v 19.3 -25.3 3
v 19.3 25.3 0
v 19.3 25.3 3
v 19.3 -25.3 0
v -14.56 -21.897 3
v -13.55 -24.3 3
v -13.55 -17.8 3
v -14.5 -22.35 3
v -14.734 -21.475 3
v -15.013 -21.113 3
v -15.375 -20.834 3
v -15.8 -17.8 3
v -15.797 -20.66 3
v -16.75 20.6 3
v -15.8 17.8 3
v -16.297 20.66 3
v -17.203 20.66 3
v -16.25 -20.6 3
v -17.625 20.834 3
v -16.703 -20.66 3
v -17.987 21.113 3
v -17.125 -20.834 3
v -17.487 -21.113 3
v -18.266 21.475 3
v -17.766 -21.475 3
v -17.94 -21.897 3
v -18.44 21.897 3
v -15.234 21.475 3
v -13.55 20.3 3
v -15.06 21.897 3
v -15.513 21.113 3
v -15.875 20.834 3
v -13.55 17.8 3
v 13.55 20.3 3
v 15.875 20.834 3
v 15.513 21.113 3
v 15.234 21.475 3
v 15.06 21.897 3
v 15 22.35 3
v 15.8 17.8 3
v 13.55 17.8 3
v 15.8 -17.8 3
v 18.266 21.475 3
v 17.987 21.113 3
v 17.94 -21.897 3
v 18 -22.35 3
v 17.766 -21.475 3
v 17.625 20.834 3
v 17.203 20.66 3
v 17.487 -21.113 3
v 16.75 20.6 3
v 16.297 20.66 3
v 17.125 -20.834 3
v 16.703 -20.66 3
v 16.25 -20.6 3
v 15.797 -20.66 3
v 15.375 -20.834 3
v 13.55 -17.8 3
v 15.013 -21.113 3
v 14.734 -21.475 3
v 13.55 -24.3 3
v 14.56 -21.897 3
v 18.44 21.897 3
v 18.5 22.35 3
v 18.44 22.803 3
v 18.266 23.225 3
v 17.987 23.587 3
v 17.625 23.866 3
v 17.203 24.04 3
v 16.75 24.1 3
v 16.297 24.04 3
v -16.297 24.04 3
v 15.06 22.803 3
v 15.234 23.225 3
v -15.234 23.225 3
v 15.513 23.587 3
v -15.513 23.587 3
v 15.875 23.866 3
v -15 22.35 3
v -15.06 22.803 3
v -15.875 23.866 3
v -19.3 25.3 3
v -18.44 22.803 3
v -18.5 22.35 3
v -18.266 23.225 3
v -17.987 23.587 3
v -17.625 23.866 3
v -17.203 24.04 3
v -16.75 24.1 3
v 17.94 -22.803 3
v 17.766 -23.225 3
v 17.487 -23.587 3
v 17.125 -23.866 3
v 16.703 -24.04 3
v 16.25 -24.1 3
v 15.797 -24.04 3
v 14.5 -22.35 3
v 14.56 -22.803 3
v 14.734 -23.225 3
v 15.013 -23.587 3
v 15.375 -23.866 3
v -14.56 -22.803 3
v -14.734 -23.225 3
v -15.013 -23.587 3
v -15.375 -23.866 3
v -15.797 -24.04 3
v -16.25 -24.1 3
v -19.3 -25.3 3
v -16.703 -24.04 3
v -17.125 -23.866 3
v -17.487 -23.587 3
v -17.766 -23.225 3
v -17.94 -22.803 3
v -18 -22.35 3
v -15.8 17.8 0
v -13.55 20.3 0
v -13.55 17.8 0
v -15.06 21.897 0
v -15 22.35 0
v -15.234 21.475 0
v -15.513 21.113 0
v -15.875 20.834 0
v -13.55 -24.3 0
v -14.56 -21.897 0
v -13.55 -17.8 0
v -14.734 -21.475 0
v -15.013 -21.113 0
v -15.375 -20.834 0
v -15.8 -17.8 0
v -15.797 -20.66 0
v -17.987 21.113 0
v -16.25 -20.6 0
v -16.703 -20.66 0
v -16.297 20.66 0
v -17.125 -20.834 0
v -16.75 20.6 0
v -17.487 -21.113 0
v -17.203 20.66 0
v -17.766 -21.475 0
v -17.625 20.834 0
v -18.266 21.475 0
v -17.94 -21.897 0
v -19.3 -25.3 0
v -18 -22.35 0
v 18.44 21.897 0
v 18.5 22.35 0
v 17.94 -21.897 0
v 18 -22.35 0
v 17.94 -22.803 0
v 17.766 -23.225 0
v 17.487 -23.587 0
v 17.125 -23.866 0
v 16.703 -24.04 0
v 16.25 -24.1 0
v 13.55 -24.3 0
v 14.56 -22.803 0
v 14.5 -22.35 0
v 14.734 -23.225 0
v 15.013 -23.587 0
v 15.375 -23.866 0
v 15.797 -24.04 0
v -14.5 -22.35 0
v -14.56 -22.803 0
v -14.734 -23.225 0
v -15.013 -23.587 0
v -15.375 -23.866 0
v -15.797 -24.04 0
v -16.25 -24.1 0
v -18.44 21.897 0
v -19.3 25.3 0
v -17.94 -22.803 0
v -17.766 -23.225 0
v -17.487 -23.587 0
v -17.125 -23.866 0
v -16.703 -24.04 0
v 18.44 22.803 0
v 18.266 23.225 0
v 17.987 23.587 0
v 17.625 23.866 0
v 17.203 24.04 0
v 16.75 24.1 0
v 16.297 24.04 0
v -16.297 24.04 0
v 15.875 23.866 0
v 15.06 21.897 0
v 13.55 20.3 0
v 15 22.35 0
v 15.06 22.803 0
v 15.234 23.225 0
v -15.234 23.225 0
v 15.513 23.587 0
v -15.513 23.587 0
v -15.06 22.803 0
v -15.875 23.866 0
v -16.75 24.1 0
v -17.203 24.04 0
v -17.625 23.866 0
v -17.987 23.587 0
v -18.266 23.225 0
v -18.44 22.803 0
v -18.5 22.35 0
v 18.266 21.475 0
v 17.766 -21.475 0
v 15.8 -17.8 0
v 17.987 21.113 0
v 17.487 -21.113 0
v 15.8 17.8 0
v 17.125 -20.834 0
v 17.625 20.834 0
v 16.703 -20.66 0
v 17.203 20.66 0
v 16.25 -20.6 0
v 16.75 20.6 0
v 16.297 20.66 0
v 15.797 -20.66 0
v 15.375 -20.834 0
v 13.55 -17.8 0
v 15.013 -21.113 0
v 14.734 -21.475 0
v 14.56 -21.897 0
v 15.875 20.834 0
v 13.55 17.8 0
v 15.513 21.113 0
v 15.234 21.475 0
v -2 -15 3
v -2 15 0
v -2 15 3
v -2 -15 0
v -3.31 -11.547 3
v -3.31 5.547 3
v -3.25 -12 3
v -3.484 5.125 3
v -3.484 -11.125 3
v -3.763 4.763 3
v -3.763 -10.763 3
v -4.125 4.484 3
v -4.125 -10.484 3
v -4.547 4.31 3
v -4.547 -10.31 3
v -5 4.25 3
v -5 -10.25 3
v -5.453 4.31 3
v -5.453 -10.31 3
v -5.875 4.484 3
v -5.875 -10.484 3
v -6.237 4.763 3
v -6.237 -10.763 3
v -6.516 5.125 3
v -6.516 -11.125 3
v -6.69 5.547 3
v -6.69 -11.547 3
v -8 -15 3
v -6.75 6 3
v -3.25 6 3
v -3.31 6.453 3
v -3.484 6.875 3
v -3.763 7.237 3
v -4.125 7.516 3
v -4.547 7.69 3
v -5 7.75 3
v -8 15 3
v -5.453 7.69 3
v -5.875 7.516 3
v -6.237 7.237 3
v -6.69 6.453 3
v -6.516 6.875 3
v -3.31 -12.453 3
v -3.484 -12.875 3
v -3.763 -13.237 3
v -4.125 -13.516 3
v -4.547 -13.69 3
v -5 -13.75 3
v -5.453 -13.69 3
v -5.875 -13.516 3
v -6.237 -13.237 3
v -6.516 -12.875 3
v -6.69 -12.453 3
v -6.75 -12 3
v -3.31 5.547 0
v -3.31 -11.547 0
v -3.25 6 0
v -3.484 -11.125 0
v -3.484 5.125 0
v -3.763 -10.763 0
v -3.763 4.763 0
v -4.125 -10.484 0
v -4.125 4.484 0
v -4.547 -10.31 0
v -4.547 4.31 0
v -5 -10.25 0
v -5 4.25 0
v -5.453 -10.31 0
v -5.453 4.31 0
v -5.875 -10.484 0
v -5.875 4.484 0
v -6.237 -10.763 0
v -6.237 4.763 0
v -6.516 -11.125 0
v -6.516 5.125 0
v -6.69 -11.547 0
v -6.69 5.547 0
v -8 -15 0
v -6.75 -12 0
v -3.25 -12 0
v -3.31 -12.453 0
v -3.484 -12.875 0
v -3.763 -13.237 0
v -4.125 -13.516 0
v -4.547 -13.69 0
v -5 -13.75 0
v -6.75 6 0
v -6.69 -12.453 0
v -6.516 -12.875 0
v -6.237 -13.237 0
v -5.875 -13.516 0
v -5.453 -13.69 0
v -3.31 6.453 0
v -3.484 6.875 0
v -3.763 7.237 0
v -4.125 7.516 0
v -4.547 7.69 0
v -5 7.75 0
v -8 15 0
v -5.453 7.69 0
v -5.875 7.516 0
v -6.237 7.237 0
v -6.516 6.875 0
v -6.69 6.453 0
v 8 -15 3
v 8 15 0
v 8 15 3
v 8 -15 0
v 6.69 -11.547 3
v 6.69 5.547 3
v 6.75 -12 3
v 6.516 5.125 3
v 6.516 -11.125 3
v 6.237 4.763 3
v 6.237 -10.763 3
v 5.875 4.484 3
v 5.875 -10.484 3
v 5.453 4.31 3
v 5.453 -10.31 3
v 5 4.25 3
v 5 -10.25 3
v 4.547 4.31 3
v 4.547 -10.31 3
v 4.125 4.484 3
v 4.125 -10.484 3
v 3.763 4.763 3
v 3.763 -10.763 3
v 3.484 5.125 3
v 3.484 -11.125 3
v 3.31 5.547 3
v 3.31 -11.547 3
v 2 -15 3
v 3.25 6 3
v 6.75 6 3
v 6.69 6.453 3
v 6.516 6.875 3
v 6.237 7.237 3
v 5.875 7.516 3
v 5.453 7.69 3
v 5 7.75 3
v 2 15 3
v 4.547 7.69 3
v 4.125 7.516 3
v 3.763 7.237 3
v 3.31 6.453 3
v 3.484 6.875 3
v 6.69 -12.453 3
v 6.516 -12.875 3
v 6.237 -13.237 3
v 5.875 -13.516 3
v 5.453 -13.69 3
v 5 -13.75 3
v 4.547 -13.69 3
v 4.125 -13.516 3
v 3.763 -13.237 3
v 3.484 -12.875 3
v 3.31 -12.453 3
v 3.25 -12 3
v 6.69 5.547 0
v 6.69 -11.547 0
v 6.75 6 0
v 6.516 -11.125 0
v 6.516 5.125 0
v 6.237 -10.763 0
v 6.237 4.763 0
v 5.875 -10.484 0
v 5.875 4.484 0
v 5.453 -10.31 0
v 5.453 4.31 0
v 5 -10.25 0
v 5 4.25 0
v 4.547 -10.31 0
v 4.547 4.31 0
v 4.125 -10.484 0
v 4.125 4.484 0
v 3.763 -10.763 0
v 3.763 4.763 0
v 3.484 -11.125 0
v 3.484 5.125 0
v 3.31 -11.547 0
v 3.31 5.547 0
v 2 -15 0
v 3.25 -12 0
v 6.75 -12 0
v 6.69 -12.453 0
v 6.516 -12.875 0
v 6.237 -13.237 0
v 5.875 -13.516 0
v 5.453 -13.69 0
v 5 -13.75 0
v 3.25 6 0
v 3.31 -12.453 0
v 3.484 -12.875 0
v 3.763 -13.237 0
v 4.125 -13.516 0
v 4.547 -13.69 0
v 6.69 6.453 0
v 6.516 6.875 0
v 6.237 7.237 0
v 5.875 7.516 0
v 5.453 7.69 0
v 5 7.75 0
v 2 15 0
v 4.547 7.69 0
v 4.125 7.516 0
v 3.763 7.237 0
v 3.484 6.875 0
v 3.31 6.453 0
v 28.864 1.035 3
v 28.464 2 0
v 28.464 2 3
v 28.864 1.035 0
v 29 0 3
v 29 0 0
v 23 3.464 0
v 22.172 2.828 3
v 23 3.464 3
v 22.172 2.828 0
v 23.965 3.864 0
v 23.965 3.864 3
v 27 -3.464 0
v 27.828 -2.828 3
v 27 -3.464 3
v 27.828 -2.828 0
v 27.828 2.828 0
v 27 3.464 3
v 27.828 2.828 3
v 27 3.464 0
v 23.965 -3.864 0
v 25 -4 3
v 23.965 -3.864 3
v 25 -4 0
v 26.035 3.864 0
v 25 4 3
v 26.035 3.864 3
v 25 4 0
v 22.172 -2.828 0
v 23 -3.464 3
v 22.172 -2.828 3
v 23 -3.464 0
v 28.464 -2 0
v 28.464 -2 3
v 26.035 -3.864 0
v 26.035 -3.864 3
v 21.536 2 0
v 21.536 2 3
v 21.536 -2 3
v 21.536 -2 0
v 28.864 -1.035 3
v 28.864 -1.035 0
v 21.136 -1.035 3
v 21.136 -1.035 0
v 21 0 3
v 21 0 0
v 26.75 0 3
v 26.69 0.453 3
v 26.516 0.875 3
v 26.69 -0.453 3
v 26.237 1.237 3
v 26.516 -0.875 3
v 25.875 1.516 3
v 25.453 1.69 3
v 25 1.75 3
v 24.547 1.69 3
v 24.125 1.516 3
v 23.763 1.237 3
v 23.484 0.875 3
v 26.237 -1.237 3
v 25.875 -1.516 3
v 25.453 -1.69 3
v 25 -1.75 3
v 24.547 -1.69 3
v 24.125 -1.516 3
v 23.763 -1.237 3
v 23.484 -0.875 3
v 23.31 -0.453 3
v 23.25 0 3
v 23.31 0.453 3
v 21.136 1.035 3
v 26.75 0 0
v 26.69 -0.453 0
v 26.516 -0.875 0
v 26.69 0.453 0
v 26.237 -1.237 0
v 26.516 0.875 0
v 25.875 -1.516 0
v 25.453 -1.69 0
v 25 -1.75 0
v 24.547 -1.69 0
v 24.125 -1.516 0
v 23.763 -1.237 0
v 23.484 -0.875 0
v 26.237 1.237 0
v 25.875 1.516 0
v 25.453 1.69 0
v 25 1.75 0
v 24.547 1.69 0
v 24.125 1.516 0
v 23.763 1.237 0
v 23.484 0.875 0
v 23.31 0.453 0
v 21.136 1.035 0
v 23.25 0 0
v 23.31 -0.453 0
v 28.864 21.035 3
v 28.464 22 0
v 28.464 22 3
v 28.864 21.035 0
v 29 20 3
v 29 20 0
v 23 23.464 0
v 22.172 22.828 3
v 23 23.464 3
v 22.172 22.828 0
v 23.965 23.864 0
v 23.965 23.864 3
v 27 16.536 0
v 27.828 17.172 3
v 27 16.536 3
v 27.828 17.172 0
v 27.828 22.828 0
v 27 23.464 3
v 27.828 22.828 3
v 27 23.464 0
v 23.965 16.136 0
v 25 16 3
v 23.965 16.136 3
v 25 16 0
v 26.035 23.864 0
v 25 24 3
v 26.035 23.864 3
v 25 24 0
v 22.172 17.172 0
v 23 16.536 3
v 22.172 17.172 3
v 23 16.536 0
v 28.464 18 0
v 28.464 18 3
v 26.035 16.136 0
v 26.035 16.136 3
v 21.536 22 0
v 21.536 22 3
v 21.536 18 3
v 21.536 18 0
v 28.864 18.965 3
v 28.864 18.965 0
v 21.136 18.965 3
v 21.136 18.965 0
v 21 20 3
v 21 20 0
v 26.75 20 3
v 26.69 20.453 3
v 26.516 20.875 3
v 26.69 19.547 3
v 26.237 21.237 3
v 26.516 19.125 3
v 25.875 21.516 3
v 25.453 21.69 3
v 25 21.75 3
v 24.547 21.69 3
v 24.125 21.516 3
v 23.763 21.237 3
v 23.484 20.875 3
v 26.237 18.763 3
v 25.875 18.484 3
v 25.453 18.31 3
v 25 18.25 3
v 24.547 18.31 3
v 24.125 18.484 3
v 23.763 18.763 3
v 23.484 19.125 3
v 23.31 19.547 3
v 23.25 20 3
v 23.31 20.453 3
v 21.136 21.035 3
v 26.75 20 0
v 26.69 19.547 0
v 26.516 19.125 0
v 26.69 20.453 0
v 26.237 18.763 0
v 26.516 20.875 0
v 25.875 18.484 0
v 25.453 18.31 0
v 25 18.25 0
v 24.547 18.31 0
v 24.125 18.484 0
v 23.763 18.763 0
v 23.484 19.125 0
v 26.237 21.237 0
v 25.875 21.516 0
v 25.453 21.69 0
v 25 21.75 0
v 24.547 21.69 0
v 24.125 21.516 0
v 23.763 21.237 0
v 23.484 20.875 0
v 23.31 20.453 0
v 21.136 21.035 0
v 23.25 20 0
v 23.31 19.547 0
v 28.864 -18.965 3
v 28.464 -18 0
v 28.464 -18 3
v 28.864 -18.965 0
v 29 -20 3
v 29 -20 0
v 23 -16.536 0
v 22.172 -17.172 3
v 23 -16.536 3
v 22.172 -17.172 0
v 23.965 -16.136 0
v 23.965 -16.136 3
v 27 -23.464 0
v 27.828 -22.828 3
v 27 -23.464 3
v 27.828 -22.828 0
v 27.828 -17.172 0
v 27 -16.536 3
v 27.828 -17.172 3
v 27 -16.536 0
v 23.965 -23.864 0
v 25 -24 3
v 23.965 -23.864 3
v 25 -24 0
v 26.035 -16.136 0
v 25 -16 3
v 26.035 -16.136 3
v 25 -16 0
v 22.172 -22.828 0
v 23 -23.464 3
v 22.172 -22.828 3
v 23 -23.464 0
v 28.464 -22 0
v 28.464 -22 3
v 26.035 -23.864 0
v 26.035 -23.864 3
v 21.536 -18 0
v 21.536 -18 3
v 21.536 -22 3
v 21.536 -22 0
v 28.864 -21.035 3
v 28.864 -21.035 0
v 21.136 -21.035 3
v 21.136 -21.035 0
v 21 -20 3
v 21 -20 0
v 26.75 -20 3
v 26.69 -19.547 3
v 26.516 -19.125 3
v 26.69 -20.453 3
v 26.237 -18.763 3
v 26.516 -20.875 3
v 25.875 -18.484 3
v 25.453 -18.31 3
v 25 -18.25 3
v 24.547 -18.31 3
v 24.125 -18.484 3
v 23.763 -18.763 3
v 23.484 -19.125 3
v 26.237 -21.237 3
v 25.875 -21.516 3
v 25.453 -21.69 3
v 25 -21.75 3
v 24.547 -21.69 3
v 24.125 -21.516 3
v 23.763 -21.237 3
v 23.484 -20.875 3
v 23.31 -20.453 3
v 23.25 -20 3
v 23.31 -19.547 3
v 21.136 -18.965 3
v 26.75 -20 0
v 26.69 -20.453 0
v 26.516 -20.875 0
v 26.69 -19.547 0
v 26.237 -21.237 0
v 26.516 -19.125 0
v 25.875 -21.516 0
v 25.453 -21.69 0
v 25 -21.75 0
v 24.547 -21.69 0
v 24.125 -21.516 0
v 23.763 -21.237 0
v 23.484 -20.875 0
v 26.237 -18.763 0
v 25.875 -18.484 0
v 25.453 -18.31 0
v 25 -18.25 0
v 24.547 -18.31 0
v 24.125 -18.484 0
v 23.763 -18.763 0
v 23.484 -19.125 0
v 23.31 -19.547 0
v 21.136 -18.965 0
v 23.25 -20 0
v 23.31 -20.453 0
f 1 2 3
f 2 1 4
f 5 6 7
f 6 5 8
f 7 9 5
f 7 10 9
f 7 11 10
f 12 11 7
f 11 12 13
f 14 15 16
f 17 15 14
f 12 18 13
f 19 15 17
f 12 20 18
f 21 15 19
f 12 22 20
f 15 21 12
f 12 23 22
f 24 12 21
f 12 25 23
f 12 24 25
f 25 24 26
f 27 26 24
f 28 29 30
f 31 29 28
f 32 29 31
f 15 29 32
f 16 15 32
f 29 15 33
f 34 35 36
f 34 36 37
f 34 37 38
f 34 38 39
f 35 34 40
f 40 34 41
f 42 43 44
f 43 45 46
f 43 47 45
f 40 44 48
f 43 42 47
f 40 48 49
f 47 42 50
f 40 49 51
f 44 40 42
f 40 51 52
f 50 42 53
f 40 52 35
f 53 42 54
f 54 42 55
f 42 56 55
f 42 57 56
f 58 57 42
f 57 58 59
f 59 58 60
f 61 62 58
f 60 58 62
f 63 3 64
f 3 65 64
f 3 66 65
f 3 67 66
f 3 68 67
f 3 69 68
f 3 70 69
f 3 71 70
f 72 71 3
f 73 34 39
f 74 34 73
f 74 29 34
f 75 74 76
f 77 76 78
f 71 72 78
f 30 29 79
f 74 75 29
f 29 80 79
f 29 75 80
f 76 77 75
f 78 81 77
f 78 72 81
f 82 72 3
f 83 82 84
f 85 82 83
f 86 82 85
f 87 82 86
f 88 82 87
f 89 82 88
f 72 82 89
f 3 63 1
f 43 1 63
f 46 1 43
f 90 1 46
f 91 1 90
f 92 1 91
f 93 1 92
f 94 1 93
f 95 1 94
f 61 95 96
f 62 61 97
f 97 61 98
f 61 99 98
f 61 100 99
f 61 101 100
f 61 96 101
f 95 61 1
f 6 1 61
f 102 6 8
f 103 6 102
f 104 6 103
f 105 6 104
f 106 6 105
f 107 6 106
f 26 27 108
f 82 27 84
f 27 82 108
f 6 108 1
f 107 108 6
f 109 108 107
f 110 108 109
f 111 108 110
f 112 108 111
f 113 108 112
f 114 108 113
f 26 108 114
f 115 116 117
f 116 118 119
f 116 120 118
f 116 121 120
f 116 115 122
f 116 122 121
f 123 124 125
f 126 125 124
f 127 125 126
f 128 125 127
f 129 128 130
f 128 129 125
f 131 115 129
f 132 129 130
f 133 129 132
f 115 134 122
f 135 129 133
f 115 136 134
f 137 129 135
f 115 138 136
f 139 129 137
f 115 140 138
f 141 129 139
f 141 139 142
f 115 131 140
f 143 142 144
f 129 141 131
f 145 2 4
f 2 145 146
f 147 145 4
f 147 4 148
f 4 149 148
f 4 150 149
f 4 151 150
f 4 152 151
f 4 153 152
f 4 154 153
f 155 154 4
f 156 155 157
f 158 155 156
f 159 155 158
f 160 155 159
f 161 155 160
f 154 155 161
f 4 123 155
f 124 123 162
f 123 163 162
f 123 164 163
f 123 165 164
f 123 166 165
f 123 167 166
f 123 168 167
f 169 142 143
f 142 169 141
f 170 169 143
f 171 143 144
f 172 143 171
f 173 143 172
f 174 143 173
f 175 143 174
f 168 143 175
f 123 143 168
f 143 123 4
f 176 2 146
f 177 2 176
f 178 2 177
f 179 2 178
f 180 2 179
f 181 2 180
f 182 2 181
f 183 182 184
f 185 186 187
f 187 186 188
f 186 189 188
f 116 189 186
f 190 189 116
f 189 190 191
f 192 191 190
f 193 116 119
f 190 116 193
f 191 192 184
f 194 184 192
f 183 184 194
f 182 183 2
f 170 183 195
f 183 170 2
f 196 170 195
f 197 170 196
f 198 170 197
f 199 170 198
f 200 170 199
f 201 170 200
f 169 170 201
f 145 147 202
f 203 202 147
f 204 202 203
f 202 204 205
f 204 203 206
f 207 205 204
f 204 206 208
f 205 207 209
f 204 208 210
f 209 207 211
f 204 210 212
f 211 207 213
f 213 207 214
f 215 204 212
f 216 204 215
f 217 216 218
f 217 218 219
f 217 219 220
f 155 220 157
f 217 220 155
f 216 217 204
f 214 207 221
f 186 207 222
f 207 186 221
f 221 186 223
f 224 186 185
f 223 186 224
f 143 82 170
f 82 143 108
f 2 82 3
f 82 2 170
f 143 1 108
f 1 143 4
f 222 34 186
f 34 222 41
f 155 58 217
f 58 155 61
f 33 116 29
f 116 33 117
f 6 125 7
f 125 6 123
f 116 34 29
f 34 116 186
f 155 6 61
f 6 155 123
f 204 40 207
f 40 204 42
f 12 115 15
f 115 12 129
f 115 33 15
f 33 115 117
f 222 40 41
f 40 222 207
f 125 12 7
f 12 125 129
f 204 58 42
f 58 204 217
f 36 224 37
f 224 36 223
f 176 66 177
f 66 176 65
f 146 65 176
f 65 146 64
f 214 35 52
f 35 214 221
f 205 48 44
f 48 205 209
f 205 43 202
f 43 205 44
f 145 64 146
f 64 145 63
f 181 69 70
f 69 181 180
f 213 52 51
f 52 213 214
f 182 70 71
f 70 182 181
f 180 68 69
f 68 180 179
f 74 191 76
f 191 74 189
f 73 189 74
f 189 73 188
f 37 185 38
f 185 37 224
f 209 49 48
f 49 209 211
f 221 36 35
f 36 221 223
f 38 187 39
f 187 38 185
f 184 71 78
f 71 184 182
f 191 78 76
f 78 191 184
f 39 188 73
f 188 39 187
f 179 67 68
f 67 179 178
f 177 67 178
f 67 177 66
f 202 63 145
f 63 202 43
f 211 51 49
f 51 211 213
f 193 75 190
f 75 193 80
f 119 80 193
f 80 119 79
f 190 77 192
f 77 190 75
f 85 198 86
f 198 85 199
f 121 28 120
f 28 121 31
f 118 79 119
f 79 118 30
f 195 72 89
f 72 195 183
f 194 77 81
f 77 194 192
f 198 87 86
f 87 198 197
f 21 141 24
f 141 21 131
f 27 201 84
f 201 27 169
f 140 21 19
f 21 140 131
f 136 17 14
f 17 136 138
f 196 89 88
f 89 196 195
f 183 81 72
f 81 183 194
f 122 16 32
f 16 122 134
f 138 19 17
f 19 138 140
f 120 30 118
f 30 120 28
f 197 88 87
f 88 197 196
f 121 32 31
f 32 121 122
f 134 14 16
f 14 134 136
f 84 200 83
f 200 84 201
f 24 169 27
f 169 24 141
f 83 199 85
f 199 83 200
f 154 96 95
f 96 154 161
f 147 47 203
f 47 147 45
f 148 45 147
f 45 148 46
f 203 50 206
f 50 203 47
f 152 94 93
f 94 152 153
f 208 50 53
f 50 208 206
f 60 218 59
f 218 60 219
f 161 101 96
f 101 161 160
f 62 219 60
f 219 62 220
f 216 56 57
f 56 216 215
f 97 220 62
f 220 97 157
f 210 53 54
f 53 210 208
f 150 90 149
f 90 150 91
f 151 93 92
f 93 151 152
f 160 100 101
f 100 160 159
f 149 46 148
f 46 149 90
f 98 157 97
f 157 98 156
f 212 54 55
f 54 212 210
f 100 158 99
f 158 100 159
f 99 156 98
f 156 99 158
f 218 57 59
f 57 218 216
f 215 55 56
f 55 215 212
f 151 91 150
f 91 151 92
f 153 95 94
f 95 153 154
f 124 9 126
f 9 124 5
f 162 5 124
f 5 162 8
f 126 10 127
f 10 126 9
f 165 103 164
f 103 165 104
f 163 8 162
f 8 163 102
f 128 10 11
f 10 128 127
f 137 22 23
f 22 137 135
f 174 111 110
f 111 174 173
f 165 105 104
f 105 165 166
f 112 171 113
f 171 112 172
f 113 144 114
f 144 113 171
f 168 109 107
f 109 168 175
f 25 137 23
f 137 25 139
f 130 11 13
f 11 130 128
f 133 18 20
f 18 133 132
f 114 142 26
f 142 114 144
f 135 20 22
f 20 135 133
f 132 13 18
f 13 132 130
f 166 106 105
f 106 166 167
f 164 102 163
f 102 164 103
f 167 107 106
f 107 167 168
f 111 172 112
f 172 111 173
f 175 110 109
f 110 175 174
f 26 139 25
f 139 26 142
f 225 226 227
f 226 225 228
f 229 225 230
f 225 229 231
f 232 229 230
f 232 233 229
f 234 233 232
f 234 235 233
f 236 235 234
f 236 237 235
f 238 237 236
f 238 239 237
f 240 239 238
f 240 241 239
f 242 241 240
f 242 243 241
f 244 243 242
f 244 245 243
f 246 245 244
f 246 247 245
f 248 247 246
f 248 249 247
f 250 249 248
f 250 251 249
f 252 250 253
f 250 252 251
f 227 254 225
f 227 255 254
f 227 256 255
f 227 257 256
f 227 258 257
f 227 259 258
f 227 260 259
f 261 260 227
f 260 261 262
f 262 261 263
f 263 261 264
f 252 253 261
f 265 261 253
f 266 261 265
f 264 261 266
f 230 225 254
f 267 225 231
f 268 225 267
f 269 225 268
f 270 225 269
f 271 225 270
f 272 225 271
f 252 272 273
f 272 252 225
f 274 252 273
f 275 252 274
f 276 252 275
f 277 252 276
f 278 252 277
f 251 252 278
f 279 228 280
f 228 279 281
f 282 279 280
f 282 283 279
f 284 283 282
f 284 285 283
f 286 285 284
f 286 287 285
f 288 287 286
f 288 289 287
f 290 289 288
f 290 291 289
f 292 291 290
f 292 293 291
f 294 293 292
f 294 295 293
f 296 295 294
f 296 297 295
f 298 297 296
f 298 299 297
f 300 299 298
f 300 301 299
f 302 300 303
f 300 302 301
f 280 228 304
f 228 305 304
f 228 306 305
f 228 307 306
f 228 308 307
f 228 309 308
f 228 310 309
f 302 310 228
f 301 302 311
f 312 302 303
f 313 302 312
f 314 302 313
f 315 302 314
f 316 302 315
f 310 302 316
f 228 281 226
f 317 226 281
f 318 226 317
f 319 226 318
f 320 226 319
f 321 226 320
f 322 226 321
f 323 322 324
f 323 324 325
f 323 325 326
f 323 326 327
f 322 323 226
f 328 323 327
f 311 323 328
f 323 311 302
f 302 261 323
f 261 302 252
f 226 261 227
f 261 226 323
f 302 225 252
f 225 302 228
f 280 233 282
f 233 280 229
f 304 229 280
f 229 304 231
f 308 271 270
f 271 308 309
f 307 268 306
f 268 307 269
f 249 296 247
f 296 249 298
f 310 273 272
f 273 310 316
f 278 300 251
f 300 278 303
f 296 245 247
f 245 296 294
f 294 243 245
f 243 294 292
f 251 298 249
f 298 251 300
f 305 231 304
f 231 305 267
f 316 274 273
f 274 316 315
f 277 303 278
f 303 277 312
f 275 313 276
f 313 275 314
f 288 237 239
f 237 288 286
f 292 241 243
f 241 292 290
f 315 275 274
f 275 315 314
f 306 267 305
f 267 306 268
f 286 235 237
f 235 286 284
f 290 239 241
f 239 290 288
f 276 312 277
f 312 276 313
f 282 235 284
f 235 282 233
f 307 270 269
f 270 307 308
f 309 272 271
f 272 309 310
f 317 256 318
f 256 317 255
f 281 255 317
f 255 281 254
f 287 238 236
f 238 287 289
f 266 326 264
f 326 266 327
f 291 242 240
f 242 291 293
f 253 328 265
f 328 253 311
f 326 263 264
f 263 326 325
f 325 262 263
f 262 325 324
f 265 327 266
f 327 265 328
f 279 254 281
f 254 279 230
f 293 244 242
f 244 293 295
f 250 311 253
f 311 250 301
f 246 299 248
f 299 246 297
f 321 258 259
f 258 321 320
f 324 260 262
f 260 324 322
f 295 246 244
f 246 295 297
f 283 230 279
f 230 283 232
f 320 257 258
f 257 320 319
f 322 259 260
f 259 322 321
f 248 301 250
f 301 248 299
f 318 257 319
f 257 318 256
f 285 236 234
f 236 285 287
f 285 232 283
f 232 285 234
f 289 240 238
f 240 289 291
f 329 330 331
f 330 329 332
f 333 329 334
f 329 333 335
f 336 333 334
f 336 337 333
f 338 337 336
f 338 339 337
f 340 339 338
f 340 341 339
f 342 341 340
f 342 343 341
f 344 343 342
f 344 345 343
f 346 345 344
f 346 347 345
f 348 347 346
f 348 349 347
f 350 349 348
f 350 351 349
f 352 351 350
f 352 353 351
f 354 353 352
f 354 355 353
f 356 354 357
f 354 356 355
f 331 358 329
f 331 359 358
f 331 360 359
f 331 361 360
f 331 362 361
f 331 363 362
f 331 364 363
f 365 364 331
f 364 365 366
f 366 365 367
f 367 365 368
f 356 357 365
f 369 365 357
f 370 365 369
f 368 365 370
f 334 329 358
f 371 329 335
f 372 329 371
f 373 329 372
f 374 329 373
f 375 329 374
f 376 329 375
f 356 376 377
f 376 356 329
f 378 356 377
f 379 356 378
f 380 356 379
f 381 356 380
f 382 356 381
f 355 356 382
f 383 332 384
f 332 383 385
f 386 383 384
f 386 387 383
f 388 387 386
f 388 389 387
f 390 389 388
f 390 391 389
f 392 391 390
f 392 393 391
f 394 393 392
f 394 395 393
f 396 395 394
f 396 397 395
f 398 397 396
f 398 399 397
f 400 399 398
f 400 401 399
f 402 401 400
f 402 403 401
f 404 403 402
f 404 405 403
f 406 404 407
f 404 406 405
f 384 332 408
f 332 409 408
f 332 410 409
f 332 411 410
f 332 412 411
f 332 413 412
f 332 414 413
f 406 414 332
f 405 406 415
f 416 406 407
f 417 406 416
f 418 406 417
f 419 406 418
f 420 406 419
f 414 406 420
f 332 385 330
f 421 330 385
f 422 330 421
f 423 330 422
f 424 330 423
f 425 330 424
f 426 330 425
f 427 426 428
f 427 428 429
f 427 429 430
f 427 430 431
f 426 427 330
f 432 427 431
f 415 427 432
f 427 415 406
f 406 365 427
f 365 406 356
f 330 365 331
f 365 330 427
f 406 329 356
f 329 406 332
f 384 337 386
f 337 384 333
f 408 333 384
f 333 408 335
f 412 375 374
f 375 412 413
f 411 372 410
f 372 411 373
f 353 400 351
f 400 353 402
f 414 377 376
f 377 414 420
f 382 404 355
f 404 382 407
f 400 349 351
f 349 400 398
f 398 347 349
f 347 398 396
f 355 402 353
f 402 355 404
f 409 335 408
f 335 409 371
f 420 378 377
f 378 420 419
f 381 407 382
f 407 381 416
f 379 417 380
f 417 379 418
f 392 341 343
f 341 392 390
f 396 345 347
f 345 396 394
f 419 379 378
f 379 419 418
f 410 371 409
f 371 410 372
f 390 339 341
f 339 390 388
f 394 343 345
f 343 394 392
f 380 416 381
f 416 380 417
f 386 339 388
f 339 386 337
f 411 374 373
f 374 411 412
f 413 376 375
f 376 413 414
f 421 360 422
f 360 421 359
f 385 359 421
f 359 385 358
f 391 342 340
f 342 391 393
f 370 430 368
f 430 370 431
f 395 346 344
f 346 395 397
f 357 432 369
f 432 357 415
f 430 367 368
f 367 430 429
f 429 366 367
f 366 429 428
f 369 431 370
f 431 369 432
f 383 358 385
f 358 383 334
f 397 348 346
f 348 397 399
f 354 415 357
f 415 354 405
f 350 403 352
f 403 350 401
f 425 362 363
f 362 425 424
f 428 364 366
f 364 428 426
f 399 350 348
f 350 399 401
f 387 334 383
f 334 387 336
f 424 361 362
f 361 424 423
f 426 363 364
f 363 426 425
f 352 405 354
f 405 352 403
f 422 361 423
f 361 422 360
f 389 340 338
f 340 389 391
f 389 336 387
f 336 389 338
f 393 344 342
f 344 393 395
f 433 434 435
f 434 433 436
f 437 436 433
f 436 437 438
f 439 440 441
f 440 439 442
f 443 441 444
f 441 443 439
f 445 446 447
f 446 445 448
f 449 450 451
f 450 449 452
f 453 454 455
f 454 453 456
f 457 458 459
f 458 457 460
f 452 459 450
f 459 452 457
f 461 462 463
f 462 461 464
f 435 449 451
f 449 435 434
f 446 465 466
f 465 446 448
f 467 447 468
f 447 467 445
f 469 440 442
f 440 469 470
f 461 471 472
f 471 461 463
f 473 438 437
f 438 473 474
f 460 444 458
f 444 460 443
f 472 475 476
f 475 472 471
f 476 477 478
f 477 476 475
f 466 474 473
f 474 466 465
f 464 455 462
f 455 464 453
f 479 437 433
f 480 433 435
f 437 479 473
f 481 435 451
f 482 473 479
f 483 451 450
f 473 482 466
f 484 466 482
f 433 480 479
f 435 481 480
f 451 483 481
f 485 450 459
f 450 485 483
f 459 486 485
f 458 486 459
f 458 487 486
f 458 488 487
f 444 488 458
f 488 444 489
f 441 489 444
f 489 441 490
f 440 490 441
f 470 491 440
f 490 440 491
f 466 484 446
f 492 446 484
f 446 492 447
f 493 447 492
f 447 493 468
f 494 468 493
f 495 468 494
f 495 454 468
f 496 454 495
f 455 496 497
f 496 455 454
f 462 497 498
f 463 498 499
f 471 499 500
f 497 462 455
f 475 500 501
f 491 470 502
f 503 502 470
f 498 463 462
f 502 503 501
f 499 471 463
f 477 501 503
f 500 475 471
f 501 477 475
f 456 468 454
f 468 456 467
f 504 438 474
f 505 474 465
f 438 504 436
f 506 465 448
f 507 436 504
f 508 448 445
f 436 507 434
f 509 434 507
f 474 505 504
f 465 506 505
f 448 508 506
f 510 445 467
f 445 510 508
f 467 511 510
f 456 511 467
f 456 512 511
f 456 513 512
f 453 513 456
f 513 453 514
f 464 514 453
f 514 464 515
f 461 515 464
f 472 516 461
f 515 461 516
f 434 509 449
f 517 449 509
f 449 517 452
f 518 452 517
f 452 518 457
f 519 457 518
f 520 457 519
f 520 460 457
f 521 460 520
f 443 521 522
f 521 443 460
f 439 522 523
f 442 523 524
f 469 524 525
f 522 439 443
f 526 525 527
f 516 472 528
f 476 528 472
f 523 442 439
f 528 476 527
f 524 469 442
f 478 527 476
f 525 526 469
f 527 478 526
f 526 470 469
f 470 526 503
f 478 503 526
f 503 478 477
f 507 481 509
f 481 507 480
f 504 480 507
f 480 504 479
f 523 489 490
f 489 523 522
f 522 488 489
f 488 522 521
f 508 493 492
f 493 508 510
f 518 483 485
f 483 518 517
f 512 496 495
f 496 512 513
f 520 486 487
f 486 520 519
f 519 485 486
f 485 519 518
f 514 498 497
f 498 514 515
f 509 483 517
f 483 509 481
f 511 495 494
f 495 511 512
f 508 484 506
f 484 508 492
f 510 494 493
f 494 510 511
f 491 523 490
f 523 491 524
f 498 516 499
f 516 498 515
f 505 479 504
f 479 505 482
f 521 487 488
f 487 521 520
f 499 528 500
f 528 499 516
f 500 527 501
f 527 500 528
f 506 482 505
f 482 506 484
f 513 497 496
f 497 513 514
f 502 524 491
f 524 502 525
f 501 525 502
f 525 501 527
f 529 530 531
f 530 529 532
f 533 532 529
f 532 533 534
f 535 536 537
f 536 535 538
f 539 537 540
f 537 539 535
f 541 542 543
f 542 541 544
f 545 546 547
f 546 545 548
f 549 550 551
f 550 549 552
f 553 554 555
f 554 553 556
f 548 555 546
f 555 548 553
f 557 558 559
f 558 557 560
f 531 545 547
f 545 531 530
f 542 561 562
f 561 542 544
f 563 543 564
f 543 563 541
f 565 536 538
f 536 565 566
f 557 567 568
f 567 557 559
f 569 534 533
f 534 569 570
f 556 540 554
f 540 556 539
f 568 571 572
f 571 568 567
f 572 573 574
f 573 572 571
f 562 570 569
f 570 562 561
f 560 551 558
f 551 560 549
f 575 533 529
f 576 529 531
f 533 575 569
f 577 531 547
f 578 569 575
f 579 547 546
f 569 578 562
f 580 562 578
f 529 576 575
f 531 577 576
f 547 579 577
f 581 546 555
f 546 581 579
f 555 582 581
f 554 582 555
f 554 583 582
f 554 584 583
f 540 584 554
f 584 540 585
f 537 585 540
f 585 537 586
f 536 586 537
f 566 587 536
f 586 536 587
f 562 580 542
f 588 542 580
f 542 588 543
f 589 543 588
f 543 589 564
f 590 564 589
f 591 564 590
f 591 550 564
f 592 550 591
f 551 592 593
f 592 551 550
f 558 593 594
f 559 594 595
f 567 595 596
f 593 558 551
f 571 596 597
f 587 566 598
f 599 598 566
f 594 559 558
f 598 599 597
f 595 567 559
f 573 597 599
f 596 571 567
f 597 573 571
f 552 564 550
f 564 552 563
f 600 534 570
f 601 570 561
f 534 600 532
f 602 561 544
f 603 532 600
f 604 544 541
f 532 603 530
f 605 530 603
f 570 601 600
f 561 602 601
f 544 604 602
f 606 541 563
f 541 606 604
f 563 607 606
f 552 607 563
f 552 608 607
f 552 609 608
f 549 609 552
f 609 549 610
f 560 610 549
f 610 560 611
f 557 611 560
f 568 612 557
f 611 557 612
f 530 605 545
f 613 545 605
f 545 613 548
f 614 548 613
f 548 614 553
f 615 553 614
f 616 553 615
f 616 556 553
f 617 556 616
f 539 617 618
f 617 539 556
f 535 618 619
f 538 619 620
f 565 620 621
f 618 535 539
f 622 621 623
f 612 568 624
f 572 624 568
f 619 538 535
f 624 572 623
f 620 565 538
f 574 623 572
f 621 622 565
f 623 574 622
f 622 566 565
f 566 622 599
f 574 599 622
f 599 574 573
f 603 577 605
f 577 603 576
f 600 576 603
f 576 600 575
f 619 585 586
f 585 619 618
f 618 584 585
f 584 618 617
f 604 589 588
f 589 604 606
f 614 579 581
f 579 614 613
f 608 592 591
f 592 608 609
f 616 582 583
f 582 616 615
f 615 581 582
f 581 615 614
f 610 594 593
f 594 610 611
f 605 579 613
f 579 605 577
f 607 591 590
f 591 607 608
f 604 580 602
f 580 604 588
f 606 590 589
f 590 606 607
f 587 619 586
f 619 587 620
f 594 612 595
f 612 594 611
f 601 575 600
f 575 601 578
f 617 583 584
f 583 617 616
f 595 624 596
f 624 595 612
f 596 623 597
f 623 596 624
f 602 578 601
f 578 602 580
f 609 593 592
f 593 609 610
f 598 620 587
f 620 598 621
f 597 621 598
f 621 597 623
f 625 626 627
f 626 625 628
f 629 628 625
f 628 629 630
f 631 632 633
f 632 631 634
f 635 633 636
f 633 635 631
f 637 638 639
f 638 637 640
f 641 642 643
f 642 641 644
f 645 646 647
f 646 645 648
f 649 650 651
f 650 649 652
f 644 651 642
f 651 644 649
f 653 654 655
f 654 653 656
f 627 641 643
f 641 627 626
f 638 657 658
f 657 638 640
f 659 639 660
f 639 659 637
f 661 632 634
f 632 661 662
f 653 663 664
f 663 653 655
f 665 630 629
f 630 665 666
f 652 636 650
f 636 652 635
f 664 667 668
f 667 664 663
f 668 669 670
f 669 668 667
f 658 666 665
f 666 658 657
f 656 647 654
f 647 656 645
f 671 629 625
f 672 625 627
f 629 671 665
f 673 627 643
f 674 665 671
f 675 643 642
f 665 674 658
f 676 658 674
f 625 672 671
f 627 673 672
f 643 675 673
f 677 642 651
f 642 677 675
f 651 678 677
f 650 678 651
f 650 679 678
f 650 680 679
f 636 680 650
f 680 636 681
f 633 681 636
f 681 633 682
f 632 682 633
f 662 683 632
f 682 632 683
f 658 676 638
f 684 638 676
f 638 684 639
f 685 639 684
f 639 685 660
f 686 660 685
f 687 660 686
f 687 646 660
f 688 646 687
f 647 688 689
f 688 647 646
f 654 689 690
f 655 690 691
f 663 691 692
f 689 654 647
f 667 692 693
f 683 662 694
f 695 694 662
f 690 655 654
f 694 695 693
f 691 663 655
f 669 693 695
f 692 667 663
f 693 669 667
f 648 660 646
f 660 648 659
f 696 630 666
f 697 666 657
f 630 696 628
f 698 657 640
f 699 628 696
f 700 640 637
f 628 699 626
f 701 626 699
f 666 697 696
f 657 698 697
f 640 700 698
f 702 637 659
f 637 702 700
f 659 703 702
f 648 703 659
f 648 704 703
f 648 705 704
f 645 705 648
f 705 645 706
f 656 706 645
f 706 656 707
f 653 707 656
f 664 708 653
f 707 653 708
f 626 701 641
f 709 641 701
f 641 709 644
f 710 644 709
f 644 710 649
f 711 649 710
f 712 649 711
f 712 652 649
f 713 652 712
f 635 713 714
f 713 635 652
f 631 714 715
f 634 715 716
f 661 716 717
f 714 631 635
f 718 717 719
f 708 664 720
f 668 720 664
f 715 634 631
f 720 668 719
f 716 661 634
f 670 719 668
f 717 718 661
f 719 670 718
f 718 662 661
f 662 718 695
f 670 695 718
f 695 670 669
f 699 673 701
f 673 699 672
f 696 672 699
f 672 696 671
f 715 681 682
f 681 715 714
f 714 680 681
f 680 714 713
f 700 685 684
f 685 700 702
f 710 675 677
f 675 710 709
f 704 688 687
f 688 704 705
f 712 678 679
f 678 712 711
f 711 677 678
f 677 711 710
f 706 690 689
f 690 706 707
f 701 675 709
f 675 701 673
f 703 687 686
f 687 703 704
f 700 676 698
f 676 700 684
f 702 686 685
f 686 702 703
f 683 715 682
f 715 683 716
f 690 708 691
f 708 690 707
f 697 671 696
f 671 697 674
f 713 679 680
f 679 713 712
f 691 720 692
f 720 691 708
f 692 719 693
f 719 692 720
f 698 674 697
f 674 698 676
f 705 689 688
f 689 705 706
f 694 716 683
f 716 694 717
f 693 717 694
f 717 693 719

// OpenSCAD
// Standoffs for mounting parts.

epsilon=0.1;
standoff_height=3;
$fn=24;

module drill(d=3.5) {
    translate([0,0,-2*standoff_height]) cylinder(r=d/2,h=4*standoff_height);
}

module relay(h=standoff_height) {
    width = 38.6;
    height = 50.6;
    drill_x_top = 33.5;
    drill_x_bot = drill_x_top - 1;
    drill_y = 44.7;
    translate([0,0,h/2]) difference() {
	cube([width, height, h], center=true);
	translate([0,-2,0]) cube([width-11.5, height-6, h+2*epsilon], center=true);
	//translate([0,-5,0]) cube([width-11, height, h+2*epsilon], center=true);
	cube([width-7, height-15, h+2*epsilon], center=true);
	translate([drill_x_top/2, drill_y/2, 0]) drill();
	translate([-drill_x_top/2, drill_y/2, 0]) drill();
	translate([drill_x_bot/2, -drill_y/2, 0]) drill();
	translate([-drill_x_bot/2, -drill_y/2, 0]) drill();
    }
}

module terminal(h=standoff_height) {
    translate([-6/2, -30/2, 0]) difference() {
	cube([6, 30, h]);
	translate([3, 3, 0]) drill();
	translate([3, 21, 0]) drill();
    }
    
}

module round_standoff(h=standoff_height, d=8) {
    difference() {
	cylinder(r=d/2, h=3);
	drill();
    }
}

module full_terminal() {
    // Terminal has two sides
    translate([-5, 0]) terminal();
    translate([5, 0]) terminal();
}

module standoff_collection() {
    // Some generic standoffs
    translate([25, 0]) round_standoff();
    translate([25, 20]) round_standoff();
    translate([25, -20]) round_standoff();
}

relay();
full_terminal();
standoff_collection();   // useful to mount RPi
